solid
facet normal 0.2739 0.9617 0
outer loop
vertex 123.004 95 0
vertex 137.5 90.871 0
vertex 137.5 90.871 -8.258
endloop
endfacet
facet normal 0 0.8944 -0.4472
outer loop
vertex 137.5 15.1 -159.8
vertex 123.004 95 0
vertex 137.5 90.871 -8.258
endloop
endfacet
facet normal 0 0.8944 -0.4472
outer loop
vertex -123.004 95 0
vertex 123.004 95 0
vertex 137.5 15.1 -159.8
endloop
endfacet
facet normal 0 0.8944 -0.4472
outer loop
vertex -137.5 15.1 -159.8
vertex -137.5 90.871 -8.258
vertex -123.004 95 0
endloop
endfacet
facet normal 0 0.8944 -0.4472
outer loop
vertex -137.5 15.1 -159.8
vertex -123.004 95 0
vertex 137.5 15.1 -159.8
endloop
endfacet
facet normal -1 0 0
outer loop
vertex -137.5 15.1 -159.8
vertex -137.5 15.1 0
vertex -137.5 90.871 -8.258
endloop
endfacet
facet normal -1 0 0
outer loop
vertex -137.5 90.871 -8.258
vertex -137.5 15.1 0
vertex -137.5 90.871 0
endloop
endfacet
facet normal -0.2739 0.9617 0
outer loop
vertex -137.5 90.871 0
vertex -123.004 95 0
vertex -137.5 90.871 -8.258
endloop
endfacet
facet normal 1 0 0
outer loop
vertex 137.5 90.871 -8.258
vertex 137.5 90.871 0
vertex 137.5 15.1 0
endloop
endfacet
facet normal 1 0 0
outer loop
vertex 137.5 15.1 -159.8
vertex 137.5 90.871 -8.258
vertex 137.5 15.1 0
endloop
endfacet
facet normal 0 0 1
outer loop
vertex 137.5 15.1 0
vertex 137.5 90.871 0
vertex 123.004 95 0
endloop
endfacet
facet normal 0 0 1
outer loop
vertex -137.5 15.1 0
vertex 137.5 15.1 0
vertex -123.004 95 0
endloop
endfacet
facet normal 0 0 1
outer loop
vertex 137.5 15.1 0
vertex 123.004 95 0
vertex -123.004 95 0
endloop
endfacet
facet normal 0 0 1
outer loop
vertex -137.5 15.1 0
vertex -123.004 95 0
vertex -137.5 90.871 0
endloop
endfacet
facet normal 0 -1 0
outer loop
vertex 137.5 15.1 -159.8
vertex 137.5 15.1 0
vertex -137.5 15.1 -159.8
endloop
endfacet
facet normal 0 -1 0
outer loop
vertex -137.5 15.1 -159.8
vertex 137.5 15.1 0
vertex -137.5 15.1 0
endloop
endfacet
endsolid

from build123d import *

# Parameters (mm, degrees)
BOSS_EXTRUDE2_DEPTH      = 200
CUT_EXTRUDE10_DEPTH      = 138.5000001
CUT_EXTRUDE10_DEPTH_BACK = 138.5000001


with BuildPart() as part:
    # Sketch18 → Boss-Extrude2 (new body)
    with BuildSketch(Plane.XY):
        with BuildLine():
            Line((137.5, 90.870921856), (137.5, 15.1))
            Line((137.5, 15.1), (-137.5, 15.1))
            Line((-137.5, 15.1), (-137.5, 90.870921856))
            add(Edge.make_bspline(
                [(137.5, 90.870921856), (0, 133.155906783), (-137.5, 90.870921856)],
                knots=[4.113742813, 4.113742813, 4.113742813, 5.311035148, 5.311035148, 5.311035148], degree=2, weights=[1, 0.82609929, 1]))
        make_face()
    extrude(amount=-BOSS_EXTRUDE2_DEPTH)

    # Sketch15 → Cut-Extrude10 (cut, two sides)
    with BuildSketch(Plane(origin=(0, 0, 0), x_dir=(0, 0, -1), z_dir=(1, 0, 0))) as cut_extrude10_sk:
        Polygon((0, 110), (0, 95), (200, -5), (200, 110), align=None)
    extrude(amount=CUT_EXTRUDE10_DEPTH, mode=Mode.SUBTRACT)
    extrude(cut_extrude10_sk.sketch, amount=-CUT_EXTRUDE10_DEPTH_BACK, mode=Mode.SUBTRACT)


solid = part.part
